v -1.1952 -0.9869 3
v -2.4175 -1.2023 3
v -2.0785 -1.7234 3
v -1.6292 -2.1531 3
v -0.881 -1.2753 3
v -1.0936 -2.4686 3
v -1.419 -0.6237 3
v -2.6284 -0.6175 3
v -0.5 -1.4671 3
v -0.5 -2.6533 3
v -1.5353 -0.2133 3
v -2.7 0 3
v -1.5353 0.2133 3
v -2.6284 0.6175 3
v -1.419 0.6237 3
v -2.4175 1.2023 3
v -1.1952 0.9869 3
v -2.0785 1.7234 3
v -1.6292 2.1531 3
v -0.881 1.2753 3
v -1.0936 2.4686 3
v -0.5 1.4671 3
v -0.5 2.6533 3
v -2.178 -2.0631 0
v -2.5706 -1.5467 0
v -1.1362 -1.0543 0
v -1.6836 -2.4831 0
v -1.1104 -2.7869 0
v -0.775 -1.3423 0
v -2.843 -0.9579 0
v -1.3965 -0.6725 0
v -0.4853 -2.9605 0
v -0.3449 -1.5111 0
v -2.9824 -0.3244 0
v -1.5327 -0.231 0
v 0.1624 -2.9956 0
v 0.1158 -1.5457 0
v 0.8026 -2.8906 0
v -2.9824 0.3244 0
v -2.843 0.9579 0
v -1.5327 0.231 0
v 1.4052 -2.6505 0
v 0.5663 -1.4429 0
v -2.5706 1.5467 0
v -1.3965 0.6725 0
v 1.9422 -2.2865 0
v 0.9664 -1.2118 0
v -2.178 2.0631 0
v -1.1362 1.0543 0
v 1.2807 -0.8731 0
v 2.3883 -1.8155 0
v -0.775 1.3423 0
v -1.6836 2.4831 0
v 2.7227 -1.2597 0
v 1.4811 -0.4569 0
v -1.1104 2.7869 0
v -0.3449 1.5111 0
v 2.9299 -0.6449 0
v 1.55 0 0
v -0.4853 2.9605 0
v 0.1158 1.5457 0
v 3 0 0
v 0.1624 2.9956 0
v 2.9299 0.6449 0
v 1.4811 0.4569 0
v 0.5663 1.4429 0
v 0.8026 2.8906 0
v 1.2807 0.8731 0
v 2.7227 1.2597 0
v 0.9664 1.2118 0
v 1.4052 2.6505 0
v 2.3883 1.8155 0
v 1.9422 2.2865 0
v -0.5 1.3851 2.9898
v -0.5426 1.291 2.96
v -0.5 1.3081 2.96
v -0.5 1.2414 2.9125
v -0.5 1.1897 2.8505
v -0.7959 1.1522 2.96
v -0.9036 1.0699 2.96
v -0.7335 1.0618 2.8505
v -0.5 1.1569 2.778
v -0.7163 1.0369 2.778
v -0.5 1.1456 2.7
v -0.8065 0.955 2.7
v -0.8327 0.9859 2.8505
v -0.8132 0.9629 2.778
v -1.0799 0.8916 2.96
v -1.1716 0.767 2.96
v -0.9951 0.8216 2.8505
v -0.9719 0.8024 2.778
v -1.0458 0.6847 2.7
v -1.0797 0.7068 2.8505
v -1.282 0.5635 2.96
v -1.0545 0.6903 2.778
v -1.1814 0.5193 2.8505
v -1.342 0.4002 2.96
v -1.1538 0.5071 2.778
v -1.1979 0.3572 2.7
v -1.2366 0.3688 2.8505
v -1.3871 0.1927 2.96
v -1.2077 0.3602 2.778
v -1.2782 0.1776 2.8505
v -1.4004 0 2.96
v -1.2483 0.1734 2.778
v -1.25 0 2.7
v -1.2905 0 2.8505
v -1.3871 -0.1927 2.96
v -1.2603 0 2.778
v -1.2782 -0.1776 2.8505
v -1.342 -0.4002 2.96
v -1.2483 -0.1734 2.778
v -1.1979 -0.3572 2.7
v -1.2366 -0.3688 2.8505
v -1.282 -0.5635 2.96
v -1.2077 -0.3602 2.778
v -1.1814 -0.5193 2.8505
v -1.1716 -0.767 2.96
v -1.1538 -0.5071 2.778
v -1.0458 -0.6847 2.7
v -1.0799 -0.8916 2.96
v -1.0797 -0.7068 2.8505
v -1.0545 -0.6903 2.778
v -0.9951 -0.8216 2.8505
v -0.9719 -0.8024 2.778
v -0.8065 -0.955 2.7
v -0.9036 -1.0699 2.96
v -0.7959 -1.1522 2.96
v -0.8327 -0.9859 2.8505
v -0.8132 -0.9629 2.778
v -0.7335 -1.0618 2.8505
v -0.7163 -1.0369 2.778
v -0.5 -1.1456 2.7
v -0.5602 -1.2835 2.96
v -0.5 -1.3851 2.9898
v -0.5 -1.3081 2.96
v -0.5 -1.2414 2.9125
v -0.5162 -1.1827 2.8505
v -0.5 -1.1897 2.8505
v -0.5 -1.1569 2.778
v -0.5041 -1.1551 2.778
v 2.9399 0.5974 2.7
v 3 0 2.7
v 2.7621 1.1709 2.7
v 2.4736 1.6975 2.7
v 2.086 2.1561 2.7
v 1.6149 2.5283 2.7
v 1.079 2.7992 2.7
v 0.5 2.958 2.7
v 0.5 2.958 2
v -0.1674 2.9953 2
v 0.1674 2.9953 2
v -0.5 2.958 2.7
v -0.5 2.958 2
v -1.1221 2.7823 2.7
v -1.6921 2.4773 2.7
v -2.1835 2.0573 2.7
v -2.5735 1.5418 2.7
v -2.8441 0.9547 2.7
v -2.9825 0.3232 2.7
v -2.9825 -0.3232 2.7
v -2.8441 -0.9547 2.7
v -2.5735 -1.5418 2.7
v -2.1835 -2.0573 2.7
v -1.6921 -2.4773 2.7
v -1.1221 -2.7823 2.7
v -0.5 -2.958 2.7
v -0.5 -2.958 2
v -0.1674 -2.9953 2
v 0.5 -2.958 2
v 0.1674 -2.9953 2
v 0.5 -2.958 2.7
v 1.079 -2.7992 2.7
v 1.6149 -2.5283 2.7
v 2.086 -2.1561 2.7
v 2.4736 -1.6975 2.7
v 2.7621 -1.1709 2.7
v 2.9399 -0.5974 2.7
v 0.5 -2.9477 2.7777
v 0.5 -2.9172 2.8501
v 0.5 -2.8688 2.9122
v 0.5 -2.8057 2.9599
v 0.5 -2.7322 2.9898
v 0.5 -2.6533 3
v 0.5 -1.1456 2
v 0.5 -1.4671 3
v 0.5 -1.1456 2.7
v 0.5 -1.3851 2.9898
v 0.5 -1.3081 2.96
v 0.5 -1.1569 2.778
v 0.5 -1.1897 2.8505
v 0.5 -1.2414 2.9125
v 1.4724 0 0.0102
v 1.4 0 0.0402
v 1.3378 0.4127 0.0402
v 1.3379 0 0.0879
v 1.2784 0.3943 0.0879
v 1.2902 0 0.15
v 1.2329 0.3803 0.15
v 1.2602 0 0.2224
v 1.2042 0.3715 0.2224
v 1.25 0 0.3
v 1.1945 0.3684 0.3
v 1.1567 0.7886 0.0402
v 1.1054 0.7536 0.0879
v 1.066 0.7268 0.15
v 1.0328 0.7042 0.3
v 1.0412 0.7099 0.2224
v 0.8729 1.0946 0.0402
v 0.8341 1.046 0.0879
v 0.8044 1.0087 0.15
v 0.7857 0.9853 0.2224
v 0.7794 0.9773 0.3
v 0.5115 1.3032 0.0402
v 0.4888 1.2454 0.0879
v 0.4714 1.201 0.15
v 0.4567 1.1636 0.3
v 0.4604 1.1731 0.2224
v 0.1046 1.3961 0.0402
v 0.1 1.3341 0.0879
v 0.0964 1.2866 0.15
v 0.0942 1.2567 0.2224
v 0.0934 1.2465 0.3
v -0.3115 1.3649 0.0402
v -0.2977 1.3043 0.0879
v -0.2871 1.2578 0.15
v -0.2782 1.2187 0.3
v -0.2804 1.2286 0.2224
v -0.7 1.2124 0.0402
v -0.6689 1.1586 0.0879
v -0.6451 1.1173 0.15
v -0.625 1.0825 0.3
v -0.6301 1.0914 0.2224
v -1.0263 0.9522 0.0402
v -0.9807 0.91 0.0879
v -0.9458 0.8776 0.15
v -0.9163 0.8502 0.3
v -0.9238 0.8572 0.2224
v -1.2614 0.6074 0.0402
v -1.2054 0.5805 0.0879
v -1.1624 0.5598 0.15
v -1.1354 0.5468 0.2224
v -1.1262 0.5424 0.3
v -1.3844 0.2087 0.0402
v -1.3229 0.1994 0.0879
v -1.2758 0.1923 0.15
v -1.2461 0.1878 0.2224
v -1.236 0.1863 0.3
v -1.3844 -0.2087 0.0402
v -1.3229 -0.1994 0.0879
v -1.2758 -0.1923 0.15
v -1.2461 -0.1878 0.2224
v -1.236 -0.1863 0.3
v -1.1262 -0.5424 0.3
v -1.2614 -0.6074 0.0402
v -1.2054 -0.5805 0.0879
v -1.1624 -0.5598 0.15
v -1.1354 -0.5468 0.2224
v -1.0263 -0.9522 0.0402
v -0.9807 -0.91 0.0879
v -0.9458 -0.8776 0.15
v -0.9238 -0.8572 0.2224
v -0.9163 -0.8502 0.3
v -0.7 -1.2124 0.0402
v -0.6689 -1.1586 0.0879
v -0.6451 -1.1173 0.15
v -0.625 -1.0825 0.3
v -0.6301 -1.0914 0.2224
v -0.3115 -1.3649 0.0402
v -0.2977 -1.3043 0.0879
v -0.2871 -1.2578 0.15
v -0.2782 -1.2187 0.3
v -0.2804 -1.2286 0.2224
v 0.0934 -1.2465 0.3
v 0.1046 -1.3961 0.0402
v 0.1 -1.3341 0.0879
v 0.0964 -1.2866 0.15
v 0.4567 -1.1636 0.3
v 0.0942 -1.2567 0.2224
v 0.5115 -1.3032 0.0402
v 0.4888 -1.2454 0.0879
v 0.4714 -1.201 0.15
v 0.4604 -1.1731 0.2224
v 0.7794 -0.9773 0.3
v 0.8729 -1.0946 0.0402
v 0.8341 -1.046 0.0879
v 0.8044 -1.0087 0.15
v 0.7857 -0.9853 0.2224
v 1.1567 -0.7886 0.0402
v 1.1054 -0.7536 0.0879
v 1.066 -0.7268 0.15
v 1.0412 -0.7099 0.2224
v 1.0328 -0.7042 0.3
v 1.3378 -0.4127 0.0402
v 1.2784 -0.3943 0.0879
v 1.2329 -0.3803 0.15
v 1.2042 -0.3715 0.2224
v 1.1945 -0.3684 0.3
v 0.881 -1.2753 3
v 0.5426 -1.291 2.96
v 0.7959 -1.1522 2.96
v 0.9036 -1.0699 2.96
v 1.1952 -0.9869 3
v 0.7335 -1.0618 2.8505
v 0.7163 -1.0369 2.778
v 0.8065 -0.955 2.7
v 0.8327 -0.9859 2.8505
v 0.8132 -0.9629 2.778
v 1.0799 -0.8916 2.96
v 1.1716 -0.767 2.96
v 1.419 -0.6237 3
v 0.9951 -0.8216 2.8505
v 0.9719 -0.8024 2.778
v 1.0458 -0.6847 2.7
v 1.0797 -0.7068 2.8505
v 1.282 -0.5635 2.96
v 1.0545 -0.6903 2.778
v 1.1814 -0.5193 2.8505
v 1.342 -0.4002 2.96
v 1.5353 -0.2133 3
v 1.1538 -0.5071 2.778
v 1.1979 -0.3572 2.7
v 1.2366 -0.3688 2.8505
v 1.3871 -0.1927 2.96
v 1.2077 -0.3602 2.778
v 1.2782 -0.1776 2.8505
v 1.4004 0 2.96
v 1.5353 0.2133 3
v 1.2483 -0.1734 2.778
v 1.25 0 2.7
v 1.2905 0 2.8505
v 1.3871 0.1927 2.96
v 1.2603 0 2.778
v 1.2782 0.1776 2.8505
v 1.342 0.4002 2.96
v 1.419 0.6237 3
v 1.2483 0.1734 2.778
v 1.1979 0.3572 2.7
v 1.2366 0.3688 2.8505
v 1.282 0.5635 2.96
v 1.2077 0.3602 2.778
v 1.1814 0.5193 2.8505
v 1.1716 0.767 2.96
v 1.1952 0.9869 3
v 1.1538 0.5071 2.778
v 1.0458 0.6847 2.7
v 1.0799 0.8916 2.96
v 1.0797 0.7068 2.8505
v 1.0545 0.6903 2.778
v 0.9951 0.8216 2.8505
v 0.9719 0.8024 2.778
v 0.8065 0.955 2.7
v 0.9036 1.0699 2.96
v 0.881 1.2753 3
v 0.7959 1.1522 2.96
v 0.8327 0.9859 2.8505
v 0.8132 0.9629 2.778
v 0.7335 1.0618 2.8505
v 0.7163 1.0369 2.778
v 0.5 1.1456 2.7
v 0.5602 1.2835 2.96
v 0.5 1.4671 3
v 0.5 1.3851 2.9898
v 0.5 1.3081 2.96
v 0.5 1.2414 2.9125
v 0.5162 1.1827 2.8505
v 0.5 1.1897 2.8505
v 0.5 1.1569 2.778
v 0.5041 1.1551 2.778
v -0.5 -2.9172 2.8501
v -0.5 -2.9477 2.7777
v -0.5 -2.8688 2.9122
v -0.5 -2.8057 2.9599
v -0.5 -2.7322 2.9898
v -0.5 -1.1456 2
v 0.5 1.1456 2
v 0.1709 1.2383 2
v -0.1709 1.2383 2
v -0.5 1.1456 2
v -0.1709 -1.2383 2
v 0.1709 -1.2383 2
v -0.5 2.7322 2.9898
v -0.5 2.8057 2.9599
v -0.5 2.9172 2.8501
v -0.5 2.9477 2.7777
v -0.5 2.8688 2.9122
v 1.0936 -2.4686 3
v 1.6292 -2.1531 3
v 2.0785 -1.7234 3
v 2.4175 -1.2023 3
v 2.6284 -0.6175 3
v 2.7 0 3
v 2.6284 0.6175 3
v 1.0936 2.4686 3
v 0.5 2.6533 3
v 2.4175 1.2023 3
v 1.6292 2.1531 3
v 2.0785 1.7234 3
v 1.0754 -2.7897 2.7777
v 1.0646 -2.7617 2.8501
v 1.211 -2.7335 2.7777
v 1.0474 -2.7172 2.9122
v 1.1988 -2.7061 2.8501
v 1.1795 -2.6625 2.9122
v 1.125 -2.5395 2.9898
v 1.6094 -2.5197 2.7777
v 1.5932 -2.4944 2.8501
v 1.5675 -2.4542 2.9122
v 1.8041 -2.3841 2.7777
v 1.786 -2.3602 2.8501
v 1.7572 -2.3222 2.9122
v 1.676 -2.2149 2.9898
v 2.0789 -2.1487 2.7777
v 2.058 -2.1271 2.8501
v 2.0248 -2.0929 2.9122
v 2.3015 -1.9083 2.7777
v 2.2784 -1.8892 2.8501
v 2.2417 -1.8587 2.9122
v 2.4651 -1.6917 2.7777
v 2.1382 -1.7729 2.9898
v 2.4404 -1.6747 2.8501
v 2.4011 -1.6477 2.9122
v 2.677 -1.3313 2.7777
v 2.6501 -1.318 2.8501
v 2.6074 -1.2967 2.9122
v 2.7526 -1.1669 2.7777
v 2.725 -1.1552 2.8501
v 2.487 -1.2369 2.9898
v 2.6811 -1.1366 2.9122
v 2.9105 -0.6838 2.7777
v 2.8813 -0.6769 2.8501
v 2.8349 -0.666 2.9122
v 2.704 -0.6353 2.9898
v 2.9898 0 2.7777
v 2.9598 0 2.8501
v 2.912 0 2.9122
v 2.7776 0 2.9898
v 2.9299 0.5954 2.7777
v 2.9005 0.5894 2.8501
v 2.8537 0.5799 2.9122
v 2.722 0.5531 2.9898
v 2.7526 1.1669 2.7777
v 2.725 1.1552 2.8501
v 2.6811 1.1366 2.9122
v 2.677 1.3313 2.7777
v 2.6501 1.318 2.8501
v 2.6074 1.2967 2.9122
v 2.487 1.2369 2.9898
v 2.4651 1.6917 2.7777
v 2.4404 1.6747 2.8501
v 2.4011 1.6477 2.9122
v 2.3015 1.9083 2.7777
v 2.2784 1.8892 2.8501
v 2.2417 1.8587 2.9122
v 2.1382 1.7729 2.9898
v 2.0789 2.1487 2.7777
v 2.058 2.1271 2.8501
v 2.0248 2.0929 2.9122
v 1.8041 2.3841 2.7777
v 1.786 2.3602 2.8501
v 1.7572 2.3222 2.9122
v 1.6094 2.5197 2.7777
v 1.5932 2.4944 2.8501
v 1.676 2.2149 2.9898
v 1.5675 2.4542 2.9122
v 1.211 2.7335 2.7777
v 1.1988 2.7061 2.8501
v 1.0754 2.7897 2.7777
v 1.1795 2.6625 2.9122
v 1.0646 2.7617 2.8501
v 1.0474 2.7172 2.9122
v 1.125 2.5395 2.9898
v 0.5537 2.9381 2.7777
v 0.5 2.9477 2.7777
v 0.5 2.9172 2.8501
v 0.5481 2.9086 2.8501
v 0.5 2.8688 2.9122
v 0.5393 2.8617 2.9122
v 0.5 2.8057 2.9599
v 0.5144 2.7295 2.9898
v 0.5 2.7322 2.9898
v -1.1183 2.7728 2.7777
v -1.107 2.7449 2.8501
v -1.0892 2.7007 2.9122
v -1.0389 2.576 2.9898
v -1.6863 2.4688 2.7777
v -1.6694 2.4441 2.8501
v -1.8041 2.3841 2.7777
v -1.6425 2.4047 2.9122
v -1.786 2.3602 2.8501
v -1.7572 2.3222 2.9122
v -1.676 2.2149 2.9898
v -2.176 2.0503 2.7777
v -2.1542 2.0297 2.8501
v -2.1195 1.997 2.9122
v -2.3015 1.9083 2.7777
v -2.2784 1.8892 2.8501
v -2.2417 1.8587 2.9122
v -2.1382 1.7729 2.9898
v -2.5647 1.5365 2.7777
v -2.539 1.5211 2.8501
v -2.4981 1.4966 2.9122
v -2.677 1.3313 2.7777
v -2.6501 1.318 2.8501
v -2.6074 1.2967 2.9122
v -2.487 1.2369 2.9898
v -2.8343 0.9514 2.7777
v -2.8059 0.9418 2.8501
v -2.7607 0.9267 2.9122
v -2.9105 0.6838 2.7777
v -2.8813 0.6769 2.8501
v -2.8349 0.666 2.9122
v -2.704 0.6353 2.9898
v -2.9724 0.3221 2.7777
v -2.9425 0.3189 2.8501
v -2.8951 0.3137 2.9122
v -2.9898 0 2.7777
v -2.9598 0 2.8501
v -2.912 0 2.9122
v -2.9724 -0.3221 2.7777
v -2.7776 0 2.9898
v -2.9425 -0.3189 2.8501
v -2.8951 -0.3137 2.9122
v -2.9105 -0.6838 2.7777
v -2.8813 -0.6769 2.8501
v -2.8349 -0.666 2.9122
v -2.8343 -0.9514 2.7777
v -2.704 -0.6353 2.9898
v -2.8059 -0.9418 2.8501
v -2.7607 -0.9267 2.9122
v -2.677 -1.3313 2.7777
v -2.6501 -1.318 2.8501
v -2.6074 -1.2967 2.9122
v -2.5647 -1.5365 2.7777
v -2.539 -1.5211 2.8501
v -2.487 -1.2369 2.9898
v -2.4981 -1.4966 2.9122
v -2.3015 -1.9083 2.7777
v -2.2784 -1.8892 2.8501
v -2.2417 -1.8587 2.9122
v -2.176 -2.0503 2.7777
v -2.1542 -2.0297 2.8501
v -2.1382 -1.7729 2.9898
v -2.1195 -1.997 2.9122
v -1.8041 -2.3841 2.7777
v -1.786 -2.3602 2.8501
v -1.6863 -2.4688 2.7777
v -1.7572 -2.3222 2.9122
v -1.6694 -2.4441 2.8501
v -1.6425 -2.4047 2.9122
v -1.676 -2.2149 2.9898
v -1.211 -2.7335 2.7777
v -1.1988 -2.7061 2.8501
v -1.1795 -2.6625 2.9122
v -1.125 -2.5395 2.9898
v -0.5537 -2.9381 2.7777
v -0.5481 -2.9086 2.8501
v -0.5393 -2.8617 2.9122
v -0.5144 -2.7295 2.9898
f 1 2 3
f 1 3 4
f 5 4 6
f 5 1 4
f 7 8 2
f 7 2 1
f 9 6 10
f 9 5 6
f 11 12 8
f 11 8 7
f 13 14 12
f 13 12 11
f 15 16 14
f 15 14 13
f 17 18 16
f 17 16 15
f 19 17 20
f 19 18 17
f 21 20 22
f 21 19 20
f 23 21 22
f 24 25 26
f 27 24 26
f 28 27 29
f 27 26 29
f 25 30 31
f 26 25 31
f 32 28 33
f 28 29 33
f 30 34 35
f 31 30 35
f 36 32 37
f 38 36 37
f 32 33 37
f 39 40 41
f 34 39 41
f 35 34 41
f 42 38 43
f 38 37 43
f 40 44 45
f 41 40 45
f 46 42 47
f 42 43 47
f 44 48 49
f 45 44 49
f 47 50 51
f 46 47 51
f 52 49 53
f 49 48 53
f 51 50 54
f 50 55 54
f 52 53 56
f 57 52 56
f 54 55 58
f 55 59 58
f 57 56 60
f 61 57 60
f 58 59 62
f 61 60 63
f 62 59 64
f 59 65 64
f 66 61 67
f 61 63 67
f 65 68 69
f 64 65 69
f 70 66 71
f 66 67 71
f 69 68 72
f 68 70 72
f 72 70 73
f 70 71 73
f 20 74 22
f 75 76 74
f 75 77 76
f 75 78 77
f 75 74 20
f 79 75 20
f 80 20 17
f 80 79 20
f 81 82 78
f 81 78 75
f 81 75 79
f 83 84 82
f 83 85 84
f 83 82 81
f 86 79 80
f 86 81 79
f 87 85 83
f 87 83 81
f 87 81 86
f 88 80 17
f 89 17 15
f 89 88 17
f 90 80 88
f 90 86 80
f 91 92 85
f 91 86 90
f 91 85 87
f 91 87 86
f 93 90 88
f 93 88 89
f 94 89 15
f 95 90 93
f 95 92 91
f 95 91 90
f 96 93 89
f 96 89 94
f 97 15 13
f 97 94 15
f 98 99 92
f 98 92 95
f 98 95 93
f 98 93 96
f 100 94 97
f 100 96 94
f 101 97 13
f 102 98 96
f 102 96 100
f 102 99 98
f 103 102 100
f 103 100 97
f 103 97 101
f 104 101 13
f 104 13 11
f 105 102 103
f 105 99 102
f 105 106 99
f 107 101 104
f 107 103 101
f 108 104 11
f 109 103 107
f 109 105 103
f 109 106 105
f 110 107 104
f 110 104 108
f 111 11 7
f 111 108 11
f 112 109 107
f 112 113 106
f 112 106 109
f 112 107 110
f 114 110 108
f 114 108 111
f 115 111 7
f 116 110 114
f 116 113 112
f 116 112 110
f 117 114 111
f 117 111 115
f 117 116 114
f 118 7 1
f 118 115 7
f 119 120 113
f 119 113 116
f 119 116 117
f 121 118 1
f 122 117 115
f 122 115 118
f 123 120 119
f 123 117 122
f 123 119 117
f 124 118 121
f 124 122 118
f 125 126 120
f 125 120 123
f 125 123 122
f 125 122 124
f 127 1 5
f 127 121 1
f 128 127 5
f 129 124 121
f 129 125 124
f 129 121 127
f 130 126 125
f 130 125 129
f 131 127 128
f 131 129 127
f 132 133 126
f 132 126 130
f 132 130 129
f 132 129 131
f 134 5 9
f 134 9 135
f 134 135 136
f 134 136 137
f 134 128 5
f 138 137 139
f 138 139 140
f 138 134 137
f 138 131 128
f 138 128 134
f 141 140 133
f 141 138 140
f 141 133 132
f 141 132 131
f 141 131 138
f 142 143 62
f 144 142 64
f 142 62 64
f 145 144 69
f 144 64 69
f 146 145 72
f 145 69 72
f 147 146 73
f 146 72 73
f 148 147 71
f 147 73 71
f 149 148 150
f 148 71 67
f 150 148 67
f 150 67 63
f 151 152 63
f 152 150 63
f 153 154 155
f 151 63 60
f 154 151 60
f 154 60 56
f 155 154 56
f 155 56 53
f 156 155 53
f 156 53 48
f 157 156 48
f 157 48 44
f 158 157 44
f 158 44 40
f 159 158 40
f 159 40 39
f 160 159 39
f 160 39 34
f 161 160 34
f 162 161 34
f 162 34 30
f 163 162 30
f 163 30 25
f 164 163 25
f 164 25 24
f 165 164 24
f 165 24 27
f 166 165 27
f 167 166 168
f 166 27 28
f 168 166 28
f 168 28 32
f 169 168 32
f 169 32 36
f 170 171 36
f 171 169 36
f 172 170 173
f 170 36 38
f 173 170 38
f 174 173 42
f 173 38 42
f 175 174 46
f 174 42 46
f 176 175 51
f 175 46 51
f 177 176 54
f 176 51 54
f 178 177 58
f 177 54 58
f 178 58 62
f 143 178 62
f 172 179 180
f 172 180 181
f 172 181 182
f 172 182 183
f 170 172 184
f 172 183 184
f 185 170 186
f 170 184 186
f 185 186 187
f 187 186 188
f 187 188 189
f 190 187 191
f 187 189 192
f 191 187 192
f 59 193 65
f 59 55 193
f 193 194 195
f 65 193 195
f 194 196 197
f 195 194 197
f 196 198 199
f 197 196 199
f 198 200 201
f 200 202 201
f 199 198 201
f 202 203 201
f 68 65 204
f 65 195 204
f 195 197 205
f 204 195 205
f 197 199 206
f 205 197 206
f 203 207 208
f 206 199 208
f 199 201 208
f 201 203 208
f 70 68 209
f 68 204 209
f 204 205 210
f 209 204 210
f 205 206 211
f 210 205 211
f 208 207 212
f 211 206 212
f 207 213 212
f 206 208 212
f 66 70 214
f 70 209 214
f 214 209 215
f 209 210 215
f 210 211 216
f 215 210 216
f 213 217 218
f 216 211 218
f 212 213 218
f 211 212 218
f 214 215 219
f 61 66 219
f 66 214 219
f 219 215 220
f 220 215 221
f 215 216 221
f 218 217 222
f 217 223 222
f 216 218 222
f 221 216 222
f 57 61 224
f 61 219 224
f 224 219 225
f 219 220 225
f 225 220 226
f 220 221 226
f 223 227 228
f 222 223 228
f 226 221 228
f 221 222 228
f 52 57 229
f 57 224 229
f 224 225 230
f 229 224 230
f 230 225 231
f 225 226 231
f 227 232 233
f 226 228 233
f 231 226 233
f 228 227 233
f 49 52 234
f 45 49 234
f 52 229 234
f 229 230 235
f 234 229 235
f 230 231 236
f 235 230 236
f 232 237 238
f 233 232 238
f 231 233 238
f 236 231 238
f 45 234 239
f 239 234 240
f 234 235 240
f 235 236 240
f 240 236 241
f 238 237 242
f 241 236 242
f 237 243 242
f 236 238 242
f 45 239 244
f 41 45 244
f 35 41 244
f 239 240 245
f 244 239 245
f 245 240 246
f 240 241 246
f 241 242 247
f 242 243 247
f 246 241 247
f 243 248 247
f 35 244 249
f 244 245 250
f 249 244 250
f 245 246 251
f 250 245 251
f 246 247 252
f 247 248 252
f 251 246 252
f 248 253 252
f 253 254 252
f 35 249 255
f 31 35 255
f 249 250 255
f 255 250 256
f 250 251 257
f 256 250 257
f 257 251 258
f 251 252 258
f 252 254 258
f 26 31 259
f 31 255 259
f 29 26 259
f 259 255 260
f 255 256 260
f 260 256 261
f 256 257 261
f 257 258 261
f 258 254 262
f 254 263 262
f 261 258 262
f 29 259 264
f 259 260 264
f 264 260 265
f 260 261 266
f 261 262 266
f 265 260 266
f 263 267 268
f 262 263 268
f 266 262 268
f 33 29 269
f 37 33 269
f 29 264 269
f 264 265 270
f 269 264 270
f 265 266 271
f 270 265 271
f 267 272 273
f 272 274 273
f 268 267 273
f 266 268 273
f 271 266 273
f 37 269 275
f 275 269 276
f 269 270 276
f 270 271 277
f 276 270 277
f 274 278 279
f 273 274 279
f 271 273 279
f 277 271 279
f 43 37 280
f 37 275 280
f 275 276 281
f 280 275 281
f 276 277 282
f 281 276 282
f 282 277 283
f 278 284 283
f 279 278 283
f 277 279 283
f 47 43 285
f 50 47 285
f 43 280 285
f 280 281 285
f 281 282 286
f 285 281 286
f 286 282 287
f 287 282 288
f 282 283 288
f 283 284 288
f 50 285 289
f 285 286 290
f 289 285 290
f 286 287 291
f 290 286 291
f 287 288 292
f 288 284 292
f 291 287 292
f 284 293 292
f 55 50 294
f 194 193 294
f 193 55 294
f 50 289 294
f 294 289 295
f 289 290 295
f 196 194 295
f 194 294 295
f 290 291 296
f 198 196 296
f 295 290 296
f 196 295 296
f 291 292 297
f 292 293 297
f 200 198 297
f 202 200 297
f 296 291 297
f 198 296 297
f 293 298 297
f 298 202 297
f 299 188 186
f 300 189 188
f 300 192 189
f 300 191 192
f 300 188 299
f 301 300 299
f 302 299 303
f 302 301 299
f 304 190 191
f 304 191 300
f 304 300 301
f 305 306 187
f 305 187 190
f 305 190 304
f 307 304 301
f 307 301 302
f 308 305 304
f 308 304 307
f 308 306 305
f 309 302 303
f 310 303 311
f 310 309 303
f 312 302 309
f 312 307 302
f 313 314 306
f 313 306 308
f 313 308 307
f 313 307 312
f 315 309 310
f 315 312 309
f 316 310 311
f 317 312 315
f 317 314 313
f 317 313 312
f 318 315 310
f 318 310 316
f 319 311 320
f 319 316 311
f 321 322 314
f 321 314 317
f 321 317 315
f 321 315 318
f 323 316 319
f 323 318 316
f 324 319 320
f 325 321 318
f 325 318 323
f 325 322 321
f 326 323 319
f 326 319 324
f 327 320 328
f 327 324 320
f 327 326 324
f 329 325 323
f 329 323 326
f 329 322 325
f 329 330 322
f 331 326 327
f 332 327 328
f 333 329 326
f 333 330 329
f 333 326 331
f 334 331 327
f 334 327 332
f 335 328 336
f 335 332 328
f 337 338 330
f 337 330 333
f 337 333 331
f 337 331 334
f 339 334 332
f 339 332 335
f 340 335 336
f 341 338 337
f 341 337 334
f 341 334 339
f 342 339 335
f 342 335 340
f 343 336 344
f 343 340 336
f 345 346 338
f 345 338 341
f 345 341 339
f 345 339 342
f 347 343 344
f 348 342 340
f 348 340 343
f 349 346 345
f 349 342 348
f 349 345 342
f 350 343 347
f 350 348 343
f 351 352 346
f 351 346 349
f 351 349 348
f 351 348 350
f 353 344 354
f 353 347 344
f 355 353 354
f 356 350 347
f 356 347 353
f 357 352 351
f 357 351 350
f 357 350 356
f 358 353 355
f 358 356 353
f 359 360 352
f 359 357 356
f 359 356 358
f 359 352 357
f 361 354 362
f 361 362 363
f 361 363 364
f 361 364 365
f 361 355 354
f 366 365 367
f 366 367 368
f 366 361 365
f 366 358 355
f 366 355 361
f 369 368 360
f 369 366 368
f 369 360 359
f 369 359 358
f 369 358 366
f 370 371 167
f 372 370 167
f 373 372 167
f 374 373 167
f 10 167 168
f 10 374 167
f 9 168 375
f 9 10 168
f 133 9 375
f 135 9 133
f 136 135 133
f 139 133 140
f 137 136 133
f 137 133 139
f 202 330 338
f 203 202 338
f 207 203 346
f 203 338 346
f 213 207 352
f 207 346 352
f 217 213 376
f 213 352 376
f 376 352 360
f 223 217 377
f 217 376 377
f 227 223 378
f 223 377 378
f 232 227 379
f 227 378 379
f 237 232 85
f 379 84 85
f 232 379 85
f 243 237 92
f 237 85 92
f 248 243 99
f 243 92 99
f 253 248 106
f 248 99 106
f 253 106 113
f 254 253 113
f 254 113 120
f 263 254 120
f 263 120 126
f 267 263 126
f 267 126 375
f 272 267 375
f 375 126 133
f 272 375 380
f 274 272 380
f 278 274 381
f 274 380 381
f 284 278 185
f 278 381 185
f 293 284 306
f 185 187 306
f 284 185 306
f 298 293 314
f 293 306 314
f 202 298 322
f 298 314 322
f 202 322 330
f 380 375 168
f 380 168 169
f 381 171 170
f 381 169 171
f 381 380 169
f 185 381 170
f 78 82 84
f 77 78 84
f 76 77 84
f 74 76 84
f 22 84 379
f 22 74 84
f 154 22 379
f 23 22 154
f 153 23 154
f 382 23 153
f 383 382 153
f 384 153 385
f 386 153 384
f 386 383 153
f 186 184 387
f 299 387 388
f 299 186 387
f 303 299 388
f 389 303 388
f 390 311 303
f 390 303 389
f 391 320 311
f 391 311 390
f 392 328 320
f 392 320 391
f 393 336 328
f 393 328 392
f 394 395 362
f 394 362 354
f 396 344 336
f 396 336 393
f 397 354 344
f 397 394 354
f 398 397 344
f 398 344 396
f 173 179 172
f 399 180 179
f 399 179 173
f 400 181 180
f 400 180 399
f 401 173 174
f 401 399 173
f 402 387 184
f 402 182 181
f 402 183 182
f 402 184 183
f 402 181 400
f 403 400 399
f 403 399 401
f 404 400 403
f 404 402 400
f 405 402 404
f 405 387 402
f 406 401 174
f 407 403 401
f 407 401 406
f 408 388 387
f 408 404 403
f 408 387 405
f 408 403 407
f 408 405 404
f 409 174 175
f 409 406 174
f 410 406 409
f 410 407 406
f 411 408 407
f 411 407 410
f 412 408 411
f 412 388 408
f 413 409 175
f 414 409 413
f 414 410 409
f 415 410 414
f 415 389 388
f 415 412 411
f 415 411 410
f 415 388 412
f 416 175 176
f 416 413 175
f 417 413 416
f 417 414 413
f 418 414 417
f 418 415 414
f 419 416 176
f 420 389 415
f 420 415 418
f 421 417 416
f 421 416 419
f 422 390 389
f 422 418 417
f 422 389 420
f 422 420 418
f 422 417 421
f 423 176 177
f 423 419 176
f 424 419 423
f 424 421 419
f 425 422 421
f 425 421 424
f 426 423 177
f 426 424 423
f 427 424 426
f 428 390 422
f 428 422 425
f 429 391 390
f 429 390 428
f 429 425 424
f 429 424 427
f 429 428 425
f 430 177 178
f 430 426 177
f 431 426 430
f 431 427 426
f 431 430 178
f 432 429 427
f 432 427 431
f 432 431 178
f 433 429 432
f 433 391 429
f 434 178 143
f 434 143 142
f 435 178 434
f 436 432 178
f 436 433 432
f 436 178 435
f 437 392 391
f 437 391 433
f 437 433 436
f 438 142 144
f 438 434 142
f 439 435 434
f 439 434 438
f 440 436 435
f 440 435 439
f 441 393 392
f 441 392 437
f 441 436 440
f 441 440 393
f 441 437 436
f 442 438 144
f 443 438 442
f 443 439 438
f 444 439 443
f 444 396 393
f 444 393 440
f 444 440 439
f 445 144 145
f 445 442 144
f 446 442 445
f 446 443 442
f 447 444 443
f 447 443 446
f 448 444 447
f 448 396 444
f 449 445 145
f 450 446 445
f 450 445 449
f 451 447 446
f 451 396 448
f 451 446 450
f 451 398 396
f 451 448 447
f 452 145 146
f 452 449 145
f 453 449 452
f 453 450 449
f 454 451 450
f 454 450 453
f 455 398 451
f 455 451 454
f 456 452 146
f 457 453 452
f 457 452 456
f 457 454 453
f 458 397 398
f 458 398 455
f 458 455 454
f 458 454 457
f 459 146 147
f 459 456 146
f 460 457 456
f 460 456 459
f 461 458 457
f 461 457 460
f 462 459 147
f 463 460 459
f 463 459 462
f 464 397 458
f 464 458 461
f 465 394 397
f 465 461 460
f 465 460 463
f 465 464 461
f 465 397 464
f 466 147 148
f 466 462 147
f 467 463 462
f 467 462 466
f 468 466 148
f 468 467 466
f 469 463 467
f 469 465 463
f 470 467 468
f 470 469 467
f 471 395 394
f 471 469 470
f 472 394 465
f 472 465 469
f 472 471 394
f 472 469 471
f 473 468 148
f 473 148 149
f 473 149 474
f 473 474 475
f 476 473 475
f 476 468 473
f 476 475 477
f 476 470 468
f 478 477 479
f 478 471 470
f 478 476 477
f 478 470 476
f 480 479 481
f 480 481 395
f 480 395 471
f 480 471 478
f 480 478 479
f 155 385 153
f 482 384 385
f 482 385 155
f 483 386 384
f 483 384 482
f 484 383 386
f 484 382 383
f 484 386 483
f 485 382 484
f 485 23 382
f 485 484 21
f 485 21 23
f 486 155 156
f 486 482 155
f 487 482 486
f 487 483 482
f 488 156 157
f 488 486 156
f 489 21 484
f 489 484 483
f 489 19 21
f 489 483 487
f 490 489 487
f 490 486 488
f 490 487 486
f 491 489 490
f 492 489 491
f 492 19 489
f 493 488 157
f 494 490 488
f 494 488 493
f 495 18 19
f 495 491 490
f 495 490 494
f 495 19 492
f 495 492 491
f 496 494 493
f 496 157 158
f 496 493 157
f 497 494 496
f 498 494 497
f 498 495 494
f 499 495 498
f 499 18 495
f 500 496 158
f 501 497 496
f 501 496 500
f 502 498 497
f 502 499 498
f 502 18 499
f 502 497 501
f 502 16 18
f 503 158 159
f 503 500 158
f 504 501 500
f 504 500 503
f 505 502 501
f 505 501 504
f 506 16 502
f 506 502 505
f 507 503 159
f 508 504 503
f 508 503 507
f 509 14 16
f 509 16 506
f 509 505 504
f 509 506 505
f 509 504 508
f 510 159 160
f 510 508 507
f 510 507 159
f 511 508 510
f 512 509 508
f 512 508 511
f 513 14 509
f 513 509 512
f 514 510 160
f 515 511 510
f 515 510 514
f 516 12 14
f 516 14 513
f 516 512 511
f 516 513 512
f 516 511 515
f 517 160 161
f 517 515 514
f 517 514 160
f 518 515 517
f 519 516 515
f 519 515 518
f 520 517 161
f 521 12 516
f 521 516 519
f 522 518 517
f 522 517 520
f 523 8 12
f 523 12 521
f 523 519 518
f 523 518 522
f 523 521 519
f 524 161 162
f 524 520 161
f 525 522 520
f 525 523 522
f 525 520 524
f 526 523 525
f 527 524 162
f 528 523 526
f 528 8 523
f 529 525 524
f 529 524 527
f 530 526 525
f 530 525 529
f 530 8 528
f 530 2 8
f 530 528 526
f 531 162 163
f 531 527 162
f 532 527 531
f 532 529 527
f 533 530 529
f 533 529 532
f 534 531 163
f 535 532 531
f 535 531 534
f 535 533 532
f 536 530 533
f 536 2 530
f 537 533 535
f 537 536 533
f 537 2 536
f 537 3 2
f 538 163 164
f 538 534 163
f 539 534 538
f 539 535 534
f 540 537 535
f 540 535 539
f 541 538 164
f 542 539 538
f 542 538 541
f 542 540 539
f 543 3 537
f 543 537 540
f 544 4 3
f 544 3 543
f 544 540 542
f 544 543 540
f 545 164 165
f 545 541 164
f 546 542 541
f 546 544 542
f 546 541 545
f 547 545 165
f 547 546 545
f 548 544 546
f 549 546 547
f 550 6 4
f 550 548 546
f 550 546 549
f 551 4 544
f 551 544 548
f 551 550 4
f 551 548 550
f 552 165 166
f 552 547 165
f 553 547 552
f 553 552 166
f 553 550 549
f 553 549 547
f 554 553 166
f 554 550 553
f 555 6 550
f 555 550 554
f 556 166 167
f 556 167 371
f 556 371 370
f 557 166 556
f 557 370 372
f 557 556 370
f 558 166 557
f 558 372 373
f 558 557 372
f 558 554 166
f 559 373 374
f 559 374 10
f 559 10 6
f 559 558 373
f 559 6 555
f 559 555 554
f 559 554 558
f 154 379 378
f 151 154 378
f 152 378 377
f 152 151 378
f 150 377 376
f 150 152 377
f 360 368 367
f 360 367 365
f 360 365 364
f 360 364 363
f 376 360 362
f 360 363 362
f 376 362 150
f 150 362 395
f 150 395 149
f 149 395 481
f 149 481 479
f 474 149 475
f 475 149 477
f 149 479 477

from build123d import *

# Parameters (mm, degrees)
SKETCH1_R           = 3
BOSS_EXTRUDE1_DEPTH = 3
SKETCH2_R           = 1.25
CUT_EXTRUDE1_DEPTH  = 6.196152423
FILLET1_R           = 0.3
SKETCH3_W           = 1
SKETCH3_H           = 8
CUT_EXTRUDE3_DEPTH  = 1


with BuildPart() as part:
    # Sketch1 → Boss-Extrude1 (new body)
    with BuildSketch(Plane.XY):
        Circle(SKETCH1_R)
    extrude(amount=BOSS_EXTRUDE1_DEPTH)

    # Sketch2 → Cut-Extrude1 (cut, through all)
    with BuildSketch(Plane.XY.offset(3)):
        Circle(SKETCH2_R)
    extrude(amount=-CUT_EXTRUDE1_DEPTH, mode=Mode.SUBTRACT)

    # Fillet1
    fillet1_edges = [part.edges().sort_by_distance(p)[0] for p in [
        (-3, 0, 3),
        (-1.25, 0, 0),
        (-1.25, 0, 3),
    ]]
    fillet(fillet1_edges, radius=FILLET1_R)

    # Sketch3 → Cut-Extrude3 (cut)
    with BuildSketch(Plane.XY.offset(3)):
        Rectangle(SKETCH3_W, SKETCH3_H)
    extrude(amount=-CUT_EXTRUDE3_DEPTH, mode=Mode.SUBTRACT)


solid = part.part
